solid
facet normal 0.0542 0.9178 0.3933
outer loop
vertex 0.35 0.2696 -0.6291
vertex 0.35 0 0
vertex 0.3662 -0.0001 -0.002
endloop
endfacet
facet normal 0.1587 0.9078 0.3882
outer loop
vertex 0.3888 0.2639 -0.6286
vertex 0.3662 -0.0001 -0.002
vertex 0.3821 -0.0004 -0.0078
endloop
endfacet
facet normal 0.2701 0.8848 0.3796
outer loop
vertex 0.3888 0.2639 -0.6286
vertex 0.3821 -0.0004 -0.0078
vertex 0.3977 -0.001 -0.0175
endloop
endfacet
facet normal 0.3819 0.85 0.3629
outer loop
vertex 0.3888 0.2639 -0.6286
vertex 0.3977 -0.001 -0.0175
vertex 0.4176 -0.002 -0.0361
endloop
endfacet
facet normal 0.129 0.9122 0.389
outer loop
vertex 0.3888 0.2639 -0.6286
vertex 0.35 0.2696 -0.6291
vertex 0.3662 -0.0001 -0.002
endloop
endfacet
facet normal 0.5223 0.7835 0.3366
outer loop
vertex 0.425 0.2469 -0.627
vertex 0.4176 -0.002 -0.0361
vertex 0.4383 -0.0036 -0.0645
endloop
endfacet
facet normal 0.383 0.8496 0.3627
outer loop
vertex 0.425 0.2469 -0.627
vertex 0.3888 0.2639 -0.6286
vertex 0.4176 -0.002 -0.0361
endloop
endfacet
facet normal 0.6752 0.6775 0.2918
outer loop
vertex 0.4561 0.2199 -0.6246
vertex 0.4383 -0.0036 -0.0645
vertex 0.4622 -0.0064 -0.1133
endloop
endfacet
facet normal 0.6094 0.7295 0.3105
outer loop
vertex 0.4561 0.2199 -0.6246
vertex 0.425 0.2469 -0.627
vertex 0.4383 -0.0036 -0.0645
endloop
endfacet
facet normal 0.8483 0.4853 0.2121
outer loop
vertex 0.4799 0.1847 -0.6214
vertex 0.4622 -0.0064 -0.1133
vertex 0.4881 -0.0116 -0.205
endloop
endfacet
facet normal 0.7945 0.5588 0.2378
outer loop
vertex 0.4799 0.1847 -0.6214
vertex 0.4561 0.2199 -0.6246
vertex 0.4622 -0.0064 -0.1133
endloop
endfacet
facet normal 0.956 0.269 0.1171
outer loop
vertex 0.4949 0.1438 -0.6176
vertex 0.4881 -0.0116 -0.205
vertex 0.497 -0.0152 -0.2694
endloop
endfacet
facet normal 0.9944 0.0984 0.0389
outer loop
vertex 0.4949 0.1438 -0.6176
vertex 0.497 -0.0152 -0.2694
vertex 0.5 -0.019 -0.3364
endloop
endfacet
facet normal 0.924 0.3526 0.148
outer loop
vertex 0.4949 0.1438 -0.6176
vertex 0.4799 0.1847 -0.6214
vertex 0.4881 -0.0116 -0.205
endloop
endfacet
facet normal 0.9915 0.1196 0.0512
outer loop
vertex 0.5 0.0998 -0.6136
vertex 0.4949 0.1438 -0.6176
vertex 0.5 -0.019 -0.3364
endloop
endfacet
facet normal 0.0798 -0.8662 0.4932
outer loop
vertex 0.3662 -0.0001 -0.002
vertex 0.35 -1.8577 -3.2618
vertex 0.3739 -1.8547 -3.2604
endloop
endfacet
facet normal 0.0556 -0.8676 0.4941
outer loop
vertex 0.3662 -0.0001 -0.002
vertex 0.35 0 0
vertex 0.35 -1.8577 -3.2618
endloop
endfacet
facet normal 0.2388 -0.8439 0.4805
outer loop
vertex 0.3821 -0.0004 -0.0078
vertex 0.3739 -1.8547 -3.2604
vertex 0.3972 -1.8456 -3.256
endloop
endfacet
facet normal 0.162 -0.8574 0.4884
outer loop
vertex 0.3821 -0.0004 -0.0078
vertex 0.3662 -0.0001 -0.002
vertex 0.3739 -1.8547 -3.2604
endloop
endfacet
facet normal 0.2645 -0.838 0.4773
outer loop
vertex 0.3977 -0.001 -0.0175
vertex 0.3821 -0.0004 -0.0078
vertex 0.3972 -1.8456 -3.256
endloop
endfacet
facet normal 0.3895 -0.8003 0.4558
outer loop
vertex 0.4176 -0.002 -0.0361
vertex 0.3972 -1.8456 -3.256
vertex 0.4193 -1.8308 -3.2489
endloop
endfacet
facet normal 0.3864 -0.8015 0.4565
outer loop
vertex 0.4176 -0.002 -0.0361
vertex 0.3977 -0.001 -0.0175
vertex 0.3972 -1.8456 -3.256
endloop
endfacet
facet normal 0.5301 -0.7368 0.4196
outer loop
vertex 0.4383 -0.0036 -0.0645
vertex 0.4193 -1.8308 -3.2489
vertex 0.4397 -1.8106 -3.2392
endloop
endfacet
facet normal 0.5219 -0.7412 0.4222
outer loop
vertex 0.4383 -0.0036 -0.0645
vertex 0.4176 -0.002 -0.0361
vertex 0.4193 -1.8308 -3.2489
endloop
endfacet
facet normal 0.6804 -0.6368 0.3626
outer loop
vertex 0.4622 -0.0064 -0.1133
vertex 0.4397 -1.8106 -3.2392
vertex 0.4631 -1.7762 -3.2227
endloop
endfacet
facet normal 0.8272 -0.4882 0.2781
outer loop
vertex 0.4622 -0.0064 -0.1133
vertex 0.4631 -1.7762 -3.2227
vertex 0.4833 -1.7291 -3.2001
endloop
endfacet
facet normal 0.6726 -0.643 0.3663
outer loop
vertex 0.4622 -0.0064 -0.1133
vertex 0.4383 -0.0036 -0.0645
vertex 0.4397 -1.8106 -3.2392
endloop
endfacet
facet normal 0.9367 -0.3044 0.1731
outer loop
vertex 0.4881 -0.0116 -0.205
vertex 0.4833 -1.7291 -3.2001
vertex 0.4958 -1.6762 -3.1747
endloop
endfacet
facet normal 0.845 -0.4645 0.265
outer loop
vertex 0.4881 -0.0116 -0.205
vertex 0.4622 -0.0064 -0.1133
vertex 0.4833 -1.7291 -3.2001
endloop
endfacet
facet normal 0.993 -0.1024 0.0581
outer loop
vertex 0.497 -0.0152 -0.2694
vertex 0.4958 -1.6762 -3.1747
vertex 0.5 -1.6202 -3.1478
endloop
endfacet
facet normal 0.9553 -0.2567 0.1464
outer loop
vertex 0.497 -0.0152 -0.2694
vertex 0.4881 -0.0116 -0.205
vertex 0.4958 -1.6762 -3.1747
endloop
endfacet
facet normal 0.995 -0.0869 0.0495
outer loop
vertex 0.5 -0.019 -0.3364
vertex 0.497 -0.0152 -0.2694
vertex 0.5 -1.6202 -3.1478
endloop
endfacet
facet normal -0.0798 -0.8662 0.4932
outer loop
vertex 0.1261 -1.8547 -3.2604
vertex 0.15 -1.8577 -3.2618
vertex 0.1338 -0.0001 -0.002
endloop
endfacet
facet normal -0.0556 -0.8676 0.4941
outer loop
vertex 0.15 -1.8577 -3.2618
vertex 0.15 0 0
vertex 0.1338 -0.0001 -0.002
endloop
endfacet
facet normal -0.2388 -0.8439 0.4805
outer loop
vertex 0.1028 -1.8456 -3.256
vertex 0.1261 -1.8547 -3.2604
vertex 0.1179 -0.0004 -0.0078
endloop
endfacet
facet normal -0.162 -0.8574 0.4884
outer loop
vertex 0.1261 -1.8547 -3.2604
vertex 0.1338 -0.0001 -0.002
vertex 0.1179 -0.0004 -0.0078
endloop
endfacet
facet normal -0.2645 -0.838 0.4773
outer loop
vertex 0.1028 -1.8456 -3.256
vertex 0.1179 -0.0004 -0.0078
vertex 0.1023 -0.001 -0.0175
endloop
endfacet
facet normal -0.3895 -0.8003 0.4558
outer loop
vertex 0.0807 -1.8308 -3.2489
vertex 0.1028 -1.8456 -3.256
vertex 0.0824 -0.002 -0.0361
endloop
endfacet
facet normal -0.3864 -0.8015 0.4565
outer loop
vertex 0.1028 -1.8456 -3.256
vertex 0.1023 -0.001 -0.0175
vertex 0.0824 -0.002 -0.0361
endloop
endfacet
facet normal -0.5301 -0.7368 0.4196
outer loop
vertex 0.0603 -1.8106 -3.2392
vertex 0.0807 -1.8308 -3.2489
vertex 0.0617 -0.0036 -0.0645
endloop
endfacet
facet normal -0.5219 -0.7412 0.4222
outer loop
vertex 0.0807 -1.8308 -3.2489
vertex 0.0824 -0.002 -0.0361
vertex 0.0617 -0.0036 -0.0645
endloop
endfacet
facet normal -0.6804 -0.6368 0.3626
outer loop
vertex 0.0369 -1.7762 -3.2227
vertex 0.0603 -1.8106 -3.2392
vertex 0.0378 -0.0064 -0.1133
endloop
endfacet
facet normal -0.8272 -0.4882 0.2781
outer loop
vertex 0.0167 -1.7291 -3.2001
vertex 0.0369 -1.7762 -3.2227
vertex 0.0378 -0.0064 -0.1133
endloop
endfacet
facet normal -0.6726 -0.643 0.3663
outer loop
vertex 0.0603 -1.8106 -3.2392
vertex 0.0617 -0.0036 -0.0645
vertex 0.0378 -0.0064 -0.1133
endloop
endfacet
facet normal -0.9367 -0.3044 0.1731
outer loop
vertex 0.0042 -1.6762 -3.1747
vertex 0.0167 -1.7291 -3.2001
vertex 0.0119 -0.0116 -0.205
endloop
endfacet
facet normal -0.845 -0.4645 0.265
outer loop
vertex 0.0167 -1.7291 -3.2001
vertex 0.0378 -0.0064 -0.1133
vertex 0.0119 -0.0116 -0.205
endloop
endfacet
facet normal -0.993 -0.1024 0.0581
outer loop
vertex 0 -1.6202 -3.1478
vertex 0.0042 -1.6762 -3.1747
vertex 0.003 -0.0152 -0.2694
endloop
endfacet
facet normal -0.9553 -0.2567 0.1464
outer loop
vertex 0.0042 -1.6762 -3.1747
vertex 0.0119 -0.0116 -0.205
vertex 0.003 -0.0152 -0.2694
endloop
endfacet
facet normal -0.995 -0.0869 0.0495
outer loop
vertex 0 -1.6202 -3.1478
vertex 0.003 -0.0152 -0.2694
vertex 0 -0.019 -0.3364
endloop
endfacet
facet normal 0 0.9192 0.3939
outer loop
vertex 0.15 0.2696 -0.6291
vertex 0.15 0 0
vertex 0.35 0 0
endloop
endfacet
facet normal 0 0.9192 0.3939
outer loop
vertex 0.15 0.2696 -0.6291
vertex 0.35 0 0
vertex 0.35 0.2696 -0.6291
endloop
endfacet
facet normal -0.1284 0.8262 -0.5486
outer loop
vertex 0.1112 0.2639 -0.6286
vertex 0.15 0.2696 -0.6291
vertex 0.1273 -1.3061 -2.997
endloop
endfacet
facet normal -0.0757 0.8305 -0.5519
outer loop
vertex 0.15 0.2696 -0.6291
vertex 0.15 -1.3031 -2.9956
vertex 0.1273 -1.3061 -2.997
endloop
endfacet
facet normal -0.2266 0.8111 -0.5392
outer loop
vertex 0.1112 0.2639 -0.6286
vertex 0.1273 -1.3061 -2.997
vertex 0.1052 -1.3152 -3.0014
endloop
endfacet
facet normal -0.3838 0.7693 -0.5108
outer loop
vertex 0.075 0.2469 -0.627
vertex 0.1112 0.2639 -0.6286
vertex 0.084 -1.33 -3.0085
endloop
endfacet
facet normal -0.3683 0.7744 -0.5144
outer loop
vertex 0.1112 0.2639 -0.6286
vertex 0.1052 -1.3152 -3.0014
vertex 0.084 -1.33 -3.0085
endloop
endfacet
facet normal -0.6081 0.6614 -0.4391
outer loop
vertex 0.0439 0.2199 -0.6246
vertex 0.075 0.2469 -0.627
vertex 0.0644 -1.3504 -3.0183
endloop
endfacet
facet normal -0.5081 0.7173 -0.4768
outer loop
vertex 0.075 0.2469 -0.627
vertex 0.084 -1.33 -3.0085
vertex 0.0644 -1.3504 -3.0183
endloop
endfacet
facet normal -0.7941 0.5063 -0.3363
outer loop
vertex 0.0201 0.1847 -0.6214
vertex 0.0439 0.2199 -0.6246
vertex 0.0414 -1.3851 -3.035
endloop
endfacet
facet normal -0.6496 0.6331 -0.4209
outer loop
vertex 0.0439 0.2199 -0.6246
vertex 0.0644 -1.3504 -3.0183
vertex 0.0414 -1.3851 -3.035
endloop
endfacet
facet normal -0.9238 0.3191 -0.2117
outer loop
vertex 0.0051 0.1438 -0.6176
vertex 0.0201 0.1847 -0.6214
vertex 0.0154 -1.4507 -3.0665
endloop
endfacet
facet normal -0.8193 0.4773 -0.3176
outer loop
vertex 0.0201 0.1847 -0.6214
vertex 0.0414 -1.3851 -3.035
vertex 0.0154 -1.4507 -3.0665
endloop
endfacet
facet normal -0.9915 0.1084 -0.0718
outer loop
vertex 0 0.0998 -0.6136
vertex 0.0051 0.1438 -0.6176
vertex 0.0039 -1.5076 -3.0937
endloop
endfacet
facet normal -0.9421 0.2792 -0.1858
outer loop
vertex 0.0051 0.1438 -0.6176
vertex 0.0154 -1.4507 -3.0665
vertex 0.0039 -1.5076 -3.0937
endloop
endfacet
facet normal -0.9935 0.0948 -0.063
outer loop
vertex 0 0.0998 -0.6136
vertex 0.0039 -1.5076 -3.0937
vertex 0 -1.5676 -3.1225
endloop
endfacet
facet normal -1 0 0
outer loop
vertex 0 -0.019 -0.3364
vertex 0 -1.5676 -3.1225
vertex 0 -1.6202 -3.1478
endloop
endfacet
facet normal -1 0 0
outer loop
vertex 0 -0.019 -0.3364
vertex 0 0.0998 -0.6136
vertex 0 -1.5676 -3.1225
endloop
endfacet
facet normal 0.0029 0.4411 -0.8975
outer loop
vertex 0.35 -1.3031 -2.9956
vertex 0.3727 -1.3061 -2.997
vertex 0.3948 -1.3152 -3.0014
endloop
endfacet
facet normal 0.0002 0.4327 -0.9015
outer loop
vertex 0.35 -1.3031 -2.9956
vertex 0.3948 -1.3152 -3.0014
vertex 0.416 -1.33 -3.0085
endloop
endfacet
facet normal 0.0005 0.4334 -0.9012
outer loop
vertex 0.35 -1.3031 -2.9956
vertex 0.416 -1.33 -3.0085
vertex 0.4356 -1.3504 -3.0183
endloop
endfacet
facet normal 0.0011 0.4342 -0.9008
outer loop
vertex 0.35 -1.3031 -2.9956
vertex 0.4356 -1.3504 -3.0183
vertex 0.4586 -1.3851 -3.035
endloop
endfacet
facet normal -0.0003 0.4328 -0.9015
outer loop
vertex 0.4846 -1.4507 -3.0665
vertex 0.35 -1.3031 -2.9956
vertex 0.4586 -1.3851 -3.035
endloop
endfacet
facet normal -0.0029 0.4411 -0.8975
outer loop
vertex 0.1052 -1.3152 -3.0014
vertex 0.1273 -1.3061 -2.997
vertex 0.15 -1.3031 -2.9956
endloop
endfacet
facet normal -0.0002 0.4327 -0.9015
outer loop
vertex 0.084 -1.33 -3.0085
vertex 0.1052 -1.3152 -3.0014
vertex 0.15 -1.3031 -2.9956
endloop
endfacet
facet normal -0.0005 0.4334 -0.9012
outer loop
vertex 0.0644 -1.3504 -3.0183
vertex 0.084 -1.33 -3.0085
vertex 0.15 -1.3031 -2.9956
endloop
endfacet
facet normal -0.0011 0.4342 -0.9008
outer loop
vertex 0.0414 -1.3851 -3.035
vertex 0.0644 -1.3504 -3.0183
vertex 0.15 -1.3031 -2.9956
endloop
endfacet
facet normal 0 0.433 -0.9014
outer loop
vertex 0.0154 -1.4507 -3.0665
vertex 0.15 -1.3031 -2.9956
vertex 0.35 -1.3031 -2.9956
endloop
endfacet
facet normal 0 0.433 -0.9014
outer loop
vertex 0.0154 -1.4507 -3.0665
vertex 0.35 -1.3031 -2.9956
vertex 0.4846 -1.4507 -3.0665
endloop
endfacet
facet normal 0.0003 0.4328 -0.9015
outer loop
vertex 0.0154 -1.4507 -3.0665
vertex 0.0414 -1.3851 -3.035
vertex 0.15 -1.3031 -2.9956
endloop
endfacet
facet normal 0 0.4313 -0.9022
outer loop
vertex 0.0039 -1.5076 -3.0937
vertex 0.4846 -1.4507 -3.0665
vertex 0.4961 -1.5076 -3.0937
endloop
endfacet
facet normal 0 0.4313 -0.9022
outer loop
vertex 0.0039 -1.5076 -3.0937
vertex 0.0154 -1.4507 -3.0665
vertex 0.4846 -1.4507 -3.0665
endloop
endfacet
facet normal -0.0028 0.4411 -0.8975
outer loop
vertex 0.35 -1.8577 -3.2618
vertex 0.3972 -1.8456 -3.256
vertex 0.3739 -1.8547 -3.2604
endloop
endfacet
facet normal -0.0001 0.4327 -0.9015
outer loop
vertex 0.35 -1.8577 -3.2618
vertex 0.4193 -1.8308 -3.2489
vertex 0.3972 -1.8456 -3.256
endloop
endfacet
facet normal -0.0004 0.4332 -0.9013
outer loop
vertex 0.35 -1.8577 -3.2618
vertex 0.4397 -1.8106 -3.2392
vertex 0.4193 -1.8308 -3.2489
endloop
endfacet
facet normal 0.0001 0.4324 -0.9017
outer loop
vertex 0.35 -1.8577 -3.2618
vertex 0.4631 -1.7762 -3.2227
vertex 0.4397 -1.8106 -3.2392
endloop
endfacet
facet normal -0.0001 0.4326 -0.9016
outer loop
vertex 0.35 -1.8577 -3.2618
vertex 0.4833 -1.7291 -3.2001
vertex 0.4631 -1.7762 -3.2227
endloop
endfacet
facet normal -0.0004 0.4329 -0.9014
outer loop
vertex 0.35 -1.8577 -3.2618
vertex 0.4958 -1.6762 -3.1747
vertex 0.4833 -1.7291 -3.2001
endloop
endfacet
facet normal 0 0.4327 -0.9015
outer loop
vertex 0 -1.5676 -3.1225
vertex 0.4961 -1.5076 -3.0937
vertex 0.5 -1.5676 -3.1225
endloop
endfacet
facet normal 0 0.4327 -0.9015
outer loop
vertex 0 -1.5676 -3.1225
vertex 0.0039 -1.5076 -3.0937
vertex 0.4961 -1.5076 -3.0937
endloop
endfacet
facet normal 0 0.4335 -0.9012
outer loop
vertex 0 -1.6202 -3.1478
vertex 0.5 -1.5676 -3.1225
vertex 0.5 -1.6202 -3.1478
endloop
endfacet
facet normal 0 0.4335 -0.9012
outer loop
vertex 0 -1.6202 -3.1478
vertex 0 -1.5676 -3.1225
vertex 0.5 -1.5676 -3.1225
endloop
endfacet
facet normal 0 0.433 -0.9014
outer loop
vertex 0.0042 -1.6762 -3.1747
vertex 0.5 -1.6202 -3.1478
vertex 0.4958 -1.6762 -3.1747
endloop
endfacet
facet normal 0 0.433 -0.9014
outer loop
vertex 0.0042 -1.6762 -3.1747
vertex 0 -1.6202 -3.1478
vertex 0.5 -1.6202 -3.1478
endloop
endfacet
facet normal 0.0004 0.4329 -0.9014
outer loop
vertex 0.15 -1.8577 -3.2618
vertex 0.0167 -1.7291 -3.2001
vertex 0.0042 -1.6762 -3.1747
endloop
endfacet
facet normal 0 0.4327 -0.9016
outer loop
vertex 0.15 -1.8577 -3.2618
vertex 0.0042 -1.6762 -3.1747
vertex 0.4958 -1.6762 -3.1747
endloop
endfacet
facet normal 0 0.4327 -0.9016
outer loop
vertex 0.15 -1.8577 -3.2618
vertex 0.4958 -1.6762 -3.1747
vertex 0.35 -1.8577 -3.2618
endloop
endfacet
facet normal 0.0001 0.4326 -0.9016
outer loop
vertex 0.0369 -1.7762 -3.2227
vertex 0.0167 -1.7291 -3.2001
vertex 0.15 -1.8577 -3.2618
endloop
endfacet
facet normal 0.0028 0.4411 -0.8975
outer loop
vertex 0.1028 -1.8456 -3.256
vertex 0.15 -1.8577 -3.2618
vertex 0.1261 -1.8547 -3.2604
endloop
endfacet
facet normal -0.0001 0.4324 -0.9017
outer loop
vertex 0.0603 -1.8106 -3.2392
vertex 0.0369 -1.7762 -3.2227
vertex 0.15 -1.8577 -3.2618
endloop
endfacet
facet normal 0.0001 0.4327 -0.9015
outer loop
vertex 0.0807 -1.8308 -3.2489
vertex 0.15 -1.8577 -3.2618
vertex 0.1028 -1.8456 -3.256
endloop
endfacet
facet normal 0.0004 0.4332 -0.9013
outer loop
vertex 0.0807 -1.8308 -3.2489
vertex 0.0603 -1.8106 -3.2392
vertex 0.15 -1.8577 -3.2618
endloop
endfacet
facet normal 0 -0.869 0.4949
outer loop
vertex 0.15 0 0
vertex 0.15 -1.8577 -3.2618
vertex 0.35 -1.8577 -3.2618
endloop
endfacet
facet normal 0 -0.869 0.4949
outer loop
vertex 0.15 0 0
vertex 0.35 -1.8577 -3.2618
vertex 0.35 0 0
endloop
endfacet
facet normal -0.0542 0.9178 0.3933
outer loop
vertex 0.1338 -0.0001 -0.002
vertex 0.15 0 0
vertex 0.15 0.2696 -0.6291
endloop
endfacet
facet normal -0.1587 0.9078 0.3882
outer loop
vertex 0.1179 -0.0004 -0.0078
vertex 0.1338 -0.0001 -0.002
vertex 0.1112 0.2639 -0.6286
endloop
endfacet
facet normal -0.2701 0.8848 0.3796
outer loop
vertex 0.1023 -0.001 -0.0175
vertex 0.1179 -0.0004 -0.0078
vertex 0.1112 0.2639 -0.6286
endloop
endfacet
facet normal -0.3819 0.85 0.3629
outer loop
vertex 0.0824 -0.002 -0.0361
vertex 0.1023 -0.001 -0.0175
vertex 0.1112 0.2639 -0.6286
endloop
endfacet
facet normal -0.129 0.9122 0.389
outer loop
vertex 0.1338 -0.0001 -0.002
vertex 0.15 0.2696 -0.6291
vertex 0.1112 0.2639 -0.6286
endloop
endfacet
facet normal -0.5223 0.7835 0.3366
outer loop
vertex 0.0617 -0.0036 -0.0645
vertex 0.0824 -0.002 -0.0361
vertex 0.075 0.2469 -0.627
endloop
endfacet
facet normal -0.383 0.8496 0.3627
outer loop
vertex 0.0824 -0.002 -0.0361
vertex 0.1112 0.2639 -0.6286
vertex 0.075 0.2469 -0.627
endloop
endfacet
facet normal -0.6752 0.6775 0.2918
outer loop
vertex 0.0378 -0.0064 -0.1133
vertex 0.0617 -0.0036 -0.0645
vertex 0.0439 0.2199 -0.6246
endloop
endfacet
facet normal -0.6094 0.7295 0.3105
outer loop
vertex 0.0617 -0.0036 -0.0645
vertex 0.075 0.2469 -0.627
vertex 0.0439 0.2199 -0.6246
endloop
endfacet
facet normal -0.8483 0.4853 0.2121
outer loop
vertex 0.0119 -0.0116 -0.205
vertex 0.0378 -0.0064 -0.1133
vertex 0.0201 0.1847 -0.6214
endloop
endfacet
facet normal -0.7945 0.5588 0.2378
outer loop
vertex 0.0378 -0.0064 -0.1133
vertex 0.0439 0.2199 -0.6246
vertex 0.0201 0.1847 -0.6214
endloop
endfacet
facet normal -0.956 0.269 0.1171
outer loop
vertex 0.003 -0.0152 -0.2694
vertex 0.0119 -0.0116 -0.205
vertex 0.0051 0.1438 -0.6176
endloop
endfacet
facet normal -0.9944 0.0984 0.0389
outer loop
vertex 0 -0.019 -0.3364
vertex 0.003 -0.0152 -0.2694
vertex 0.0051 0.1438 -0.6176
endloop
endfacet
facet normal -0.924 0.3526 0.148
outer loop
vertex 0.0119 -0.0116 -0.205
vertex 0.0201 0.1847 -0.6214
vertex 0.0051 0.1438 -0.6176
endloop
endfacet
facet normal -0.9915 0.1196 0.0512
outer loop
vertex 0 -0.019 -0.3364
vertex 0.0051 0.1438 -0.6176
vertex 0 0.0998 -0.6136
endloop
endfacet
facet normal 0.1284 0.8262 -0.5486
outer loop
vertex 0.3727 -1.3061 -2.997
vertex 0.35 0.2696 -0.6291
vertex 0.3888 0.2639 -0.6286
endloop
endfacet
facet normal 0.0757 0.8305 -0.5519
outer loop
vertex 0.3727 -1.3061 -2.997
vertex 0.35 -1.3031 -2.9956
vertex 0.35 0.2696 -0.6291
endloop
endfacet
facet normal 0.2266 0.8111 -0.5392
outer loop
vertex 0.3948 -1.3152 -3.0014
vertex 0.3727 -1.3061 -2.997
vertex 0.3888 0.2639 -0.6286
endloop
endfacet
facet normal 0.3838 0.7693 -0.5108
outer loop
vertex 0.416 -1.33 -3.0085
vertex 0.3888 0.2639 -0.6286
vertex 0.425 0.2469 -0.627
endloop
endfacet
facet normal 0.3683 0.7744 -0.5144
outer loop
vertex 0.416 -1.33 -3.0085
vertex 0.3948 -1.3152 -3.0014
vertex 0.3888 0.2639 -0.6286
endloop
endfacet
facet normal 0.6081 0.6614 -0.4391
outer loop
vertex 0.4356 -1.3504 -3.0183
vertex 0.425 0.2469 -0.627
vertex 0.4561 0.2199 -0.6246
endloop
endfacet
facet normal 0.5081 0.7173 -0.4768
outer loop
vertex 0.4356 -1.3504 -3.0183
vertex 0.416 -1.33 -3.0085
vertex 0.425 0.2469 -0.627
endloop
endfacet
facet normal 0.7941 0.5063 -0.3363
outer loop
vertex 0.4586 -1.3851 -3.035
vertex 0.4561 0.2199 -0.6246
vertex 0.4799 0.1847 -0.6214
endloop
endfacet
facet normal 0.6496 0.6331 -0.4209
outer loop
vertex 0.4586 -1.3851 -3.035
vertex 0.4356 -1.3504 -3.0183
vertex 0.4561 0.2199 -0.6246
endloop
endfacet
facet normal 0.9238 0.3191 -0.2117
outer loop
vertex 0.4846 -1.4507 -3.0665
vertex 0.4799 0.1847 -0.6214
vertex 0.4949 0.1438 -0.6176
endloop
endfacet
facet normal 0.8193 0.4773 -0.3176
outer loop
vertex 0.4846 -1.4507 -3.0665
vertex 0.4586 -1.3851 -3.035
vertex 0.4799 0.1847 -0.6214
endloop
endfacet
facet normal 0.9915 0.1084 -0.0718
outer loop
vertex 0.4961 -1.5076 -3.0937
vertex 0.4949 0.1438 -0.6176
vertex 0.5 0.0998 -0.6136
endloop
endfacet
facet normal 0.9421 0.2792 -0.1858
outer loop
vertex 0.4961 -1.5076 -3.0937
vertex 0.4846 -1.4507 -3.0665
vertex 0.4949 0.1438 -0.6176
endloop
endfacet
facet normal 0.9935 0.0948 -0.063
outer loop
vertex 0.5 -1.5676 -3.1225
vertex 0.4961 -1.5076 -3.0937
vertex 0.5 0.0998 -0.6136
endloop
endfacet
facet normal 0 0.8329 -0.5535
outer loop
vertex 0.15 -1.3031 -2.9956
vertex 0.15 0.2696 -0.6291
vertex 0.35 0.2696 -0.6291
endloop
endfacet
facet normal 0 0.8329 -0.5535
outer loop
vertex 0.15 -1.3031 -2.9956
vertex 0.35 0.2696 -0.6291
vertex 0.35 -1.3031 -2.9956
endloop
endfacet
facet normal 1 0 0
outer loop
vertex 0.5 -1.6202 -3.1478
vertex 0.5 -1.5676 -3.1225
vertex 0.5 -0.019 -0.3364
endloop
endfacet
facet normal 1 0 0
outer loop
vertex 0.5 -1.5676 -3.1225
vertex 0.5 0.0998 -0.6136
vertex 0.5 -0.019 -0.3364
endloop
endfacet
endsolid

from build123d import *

# Parameters (mm, degrees)
BOSS_EXTRUDE1_DEPTH = 0.5
FILLET1_R           = 0.15


with BuildPart() as part:
    # Sketch1 → Boss-Extrude1 (new body)
    with BuildSketch(Plane(origin=(0, 0, 0), x_dir=(0, 0, -1), z_dir=(1, 0, 0))):
        Polygon((0, 0), (0.629095992, 0.269645832), (2.995585653, -1.303083755), (3.26181574, -1.857729769), align=None)
    extrude(amount=BOSS_EXTRUDE1_DEPTH)

    # Fillet1
    fillet1_edges = [part.edges().sort_by_distance(p)[0] for p in [
        (0.5, -0.516718961, -1.812340822),
        (0.5, 0.134822916, -0.314547996),
        (0.5, -0.928864885, -1.63090787),
        (0, 0.134822916, -0.314547996),
        (0, -0.516718961, -1.812340822),
        (0, -0.928864885, -1.63090787),
    ]]
    fillet(fillet1_edges, radius=FILLET1_R)


solid = part.part
